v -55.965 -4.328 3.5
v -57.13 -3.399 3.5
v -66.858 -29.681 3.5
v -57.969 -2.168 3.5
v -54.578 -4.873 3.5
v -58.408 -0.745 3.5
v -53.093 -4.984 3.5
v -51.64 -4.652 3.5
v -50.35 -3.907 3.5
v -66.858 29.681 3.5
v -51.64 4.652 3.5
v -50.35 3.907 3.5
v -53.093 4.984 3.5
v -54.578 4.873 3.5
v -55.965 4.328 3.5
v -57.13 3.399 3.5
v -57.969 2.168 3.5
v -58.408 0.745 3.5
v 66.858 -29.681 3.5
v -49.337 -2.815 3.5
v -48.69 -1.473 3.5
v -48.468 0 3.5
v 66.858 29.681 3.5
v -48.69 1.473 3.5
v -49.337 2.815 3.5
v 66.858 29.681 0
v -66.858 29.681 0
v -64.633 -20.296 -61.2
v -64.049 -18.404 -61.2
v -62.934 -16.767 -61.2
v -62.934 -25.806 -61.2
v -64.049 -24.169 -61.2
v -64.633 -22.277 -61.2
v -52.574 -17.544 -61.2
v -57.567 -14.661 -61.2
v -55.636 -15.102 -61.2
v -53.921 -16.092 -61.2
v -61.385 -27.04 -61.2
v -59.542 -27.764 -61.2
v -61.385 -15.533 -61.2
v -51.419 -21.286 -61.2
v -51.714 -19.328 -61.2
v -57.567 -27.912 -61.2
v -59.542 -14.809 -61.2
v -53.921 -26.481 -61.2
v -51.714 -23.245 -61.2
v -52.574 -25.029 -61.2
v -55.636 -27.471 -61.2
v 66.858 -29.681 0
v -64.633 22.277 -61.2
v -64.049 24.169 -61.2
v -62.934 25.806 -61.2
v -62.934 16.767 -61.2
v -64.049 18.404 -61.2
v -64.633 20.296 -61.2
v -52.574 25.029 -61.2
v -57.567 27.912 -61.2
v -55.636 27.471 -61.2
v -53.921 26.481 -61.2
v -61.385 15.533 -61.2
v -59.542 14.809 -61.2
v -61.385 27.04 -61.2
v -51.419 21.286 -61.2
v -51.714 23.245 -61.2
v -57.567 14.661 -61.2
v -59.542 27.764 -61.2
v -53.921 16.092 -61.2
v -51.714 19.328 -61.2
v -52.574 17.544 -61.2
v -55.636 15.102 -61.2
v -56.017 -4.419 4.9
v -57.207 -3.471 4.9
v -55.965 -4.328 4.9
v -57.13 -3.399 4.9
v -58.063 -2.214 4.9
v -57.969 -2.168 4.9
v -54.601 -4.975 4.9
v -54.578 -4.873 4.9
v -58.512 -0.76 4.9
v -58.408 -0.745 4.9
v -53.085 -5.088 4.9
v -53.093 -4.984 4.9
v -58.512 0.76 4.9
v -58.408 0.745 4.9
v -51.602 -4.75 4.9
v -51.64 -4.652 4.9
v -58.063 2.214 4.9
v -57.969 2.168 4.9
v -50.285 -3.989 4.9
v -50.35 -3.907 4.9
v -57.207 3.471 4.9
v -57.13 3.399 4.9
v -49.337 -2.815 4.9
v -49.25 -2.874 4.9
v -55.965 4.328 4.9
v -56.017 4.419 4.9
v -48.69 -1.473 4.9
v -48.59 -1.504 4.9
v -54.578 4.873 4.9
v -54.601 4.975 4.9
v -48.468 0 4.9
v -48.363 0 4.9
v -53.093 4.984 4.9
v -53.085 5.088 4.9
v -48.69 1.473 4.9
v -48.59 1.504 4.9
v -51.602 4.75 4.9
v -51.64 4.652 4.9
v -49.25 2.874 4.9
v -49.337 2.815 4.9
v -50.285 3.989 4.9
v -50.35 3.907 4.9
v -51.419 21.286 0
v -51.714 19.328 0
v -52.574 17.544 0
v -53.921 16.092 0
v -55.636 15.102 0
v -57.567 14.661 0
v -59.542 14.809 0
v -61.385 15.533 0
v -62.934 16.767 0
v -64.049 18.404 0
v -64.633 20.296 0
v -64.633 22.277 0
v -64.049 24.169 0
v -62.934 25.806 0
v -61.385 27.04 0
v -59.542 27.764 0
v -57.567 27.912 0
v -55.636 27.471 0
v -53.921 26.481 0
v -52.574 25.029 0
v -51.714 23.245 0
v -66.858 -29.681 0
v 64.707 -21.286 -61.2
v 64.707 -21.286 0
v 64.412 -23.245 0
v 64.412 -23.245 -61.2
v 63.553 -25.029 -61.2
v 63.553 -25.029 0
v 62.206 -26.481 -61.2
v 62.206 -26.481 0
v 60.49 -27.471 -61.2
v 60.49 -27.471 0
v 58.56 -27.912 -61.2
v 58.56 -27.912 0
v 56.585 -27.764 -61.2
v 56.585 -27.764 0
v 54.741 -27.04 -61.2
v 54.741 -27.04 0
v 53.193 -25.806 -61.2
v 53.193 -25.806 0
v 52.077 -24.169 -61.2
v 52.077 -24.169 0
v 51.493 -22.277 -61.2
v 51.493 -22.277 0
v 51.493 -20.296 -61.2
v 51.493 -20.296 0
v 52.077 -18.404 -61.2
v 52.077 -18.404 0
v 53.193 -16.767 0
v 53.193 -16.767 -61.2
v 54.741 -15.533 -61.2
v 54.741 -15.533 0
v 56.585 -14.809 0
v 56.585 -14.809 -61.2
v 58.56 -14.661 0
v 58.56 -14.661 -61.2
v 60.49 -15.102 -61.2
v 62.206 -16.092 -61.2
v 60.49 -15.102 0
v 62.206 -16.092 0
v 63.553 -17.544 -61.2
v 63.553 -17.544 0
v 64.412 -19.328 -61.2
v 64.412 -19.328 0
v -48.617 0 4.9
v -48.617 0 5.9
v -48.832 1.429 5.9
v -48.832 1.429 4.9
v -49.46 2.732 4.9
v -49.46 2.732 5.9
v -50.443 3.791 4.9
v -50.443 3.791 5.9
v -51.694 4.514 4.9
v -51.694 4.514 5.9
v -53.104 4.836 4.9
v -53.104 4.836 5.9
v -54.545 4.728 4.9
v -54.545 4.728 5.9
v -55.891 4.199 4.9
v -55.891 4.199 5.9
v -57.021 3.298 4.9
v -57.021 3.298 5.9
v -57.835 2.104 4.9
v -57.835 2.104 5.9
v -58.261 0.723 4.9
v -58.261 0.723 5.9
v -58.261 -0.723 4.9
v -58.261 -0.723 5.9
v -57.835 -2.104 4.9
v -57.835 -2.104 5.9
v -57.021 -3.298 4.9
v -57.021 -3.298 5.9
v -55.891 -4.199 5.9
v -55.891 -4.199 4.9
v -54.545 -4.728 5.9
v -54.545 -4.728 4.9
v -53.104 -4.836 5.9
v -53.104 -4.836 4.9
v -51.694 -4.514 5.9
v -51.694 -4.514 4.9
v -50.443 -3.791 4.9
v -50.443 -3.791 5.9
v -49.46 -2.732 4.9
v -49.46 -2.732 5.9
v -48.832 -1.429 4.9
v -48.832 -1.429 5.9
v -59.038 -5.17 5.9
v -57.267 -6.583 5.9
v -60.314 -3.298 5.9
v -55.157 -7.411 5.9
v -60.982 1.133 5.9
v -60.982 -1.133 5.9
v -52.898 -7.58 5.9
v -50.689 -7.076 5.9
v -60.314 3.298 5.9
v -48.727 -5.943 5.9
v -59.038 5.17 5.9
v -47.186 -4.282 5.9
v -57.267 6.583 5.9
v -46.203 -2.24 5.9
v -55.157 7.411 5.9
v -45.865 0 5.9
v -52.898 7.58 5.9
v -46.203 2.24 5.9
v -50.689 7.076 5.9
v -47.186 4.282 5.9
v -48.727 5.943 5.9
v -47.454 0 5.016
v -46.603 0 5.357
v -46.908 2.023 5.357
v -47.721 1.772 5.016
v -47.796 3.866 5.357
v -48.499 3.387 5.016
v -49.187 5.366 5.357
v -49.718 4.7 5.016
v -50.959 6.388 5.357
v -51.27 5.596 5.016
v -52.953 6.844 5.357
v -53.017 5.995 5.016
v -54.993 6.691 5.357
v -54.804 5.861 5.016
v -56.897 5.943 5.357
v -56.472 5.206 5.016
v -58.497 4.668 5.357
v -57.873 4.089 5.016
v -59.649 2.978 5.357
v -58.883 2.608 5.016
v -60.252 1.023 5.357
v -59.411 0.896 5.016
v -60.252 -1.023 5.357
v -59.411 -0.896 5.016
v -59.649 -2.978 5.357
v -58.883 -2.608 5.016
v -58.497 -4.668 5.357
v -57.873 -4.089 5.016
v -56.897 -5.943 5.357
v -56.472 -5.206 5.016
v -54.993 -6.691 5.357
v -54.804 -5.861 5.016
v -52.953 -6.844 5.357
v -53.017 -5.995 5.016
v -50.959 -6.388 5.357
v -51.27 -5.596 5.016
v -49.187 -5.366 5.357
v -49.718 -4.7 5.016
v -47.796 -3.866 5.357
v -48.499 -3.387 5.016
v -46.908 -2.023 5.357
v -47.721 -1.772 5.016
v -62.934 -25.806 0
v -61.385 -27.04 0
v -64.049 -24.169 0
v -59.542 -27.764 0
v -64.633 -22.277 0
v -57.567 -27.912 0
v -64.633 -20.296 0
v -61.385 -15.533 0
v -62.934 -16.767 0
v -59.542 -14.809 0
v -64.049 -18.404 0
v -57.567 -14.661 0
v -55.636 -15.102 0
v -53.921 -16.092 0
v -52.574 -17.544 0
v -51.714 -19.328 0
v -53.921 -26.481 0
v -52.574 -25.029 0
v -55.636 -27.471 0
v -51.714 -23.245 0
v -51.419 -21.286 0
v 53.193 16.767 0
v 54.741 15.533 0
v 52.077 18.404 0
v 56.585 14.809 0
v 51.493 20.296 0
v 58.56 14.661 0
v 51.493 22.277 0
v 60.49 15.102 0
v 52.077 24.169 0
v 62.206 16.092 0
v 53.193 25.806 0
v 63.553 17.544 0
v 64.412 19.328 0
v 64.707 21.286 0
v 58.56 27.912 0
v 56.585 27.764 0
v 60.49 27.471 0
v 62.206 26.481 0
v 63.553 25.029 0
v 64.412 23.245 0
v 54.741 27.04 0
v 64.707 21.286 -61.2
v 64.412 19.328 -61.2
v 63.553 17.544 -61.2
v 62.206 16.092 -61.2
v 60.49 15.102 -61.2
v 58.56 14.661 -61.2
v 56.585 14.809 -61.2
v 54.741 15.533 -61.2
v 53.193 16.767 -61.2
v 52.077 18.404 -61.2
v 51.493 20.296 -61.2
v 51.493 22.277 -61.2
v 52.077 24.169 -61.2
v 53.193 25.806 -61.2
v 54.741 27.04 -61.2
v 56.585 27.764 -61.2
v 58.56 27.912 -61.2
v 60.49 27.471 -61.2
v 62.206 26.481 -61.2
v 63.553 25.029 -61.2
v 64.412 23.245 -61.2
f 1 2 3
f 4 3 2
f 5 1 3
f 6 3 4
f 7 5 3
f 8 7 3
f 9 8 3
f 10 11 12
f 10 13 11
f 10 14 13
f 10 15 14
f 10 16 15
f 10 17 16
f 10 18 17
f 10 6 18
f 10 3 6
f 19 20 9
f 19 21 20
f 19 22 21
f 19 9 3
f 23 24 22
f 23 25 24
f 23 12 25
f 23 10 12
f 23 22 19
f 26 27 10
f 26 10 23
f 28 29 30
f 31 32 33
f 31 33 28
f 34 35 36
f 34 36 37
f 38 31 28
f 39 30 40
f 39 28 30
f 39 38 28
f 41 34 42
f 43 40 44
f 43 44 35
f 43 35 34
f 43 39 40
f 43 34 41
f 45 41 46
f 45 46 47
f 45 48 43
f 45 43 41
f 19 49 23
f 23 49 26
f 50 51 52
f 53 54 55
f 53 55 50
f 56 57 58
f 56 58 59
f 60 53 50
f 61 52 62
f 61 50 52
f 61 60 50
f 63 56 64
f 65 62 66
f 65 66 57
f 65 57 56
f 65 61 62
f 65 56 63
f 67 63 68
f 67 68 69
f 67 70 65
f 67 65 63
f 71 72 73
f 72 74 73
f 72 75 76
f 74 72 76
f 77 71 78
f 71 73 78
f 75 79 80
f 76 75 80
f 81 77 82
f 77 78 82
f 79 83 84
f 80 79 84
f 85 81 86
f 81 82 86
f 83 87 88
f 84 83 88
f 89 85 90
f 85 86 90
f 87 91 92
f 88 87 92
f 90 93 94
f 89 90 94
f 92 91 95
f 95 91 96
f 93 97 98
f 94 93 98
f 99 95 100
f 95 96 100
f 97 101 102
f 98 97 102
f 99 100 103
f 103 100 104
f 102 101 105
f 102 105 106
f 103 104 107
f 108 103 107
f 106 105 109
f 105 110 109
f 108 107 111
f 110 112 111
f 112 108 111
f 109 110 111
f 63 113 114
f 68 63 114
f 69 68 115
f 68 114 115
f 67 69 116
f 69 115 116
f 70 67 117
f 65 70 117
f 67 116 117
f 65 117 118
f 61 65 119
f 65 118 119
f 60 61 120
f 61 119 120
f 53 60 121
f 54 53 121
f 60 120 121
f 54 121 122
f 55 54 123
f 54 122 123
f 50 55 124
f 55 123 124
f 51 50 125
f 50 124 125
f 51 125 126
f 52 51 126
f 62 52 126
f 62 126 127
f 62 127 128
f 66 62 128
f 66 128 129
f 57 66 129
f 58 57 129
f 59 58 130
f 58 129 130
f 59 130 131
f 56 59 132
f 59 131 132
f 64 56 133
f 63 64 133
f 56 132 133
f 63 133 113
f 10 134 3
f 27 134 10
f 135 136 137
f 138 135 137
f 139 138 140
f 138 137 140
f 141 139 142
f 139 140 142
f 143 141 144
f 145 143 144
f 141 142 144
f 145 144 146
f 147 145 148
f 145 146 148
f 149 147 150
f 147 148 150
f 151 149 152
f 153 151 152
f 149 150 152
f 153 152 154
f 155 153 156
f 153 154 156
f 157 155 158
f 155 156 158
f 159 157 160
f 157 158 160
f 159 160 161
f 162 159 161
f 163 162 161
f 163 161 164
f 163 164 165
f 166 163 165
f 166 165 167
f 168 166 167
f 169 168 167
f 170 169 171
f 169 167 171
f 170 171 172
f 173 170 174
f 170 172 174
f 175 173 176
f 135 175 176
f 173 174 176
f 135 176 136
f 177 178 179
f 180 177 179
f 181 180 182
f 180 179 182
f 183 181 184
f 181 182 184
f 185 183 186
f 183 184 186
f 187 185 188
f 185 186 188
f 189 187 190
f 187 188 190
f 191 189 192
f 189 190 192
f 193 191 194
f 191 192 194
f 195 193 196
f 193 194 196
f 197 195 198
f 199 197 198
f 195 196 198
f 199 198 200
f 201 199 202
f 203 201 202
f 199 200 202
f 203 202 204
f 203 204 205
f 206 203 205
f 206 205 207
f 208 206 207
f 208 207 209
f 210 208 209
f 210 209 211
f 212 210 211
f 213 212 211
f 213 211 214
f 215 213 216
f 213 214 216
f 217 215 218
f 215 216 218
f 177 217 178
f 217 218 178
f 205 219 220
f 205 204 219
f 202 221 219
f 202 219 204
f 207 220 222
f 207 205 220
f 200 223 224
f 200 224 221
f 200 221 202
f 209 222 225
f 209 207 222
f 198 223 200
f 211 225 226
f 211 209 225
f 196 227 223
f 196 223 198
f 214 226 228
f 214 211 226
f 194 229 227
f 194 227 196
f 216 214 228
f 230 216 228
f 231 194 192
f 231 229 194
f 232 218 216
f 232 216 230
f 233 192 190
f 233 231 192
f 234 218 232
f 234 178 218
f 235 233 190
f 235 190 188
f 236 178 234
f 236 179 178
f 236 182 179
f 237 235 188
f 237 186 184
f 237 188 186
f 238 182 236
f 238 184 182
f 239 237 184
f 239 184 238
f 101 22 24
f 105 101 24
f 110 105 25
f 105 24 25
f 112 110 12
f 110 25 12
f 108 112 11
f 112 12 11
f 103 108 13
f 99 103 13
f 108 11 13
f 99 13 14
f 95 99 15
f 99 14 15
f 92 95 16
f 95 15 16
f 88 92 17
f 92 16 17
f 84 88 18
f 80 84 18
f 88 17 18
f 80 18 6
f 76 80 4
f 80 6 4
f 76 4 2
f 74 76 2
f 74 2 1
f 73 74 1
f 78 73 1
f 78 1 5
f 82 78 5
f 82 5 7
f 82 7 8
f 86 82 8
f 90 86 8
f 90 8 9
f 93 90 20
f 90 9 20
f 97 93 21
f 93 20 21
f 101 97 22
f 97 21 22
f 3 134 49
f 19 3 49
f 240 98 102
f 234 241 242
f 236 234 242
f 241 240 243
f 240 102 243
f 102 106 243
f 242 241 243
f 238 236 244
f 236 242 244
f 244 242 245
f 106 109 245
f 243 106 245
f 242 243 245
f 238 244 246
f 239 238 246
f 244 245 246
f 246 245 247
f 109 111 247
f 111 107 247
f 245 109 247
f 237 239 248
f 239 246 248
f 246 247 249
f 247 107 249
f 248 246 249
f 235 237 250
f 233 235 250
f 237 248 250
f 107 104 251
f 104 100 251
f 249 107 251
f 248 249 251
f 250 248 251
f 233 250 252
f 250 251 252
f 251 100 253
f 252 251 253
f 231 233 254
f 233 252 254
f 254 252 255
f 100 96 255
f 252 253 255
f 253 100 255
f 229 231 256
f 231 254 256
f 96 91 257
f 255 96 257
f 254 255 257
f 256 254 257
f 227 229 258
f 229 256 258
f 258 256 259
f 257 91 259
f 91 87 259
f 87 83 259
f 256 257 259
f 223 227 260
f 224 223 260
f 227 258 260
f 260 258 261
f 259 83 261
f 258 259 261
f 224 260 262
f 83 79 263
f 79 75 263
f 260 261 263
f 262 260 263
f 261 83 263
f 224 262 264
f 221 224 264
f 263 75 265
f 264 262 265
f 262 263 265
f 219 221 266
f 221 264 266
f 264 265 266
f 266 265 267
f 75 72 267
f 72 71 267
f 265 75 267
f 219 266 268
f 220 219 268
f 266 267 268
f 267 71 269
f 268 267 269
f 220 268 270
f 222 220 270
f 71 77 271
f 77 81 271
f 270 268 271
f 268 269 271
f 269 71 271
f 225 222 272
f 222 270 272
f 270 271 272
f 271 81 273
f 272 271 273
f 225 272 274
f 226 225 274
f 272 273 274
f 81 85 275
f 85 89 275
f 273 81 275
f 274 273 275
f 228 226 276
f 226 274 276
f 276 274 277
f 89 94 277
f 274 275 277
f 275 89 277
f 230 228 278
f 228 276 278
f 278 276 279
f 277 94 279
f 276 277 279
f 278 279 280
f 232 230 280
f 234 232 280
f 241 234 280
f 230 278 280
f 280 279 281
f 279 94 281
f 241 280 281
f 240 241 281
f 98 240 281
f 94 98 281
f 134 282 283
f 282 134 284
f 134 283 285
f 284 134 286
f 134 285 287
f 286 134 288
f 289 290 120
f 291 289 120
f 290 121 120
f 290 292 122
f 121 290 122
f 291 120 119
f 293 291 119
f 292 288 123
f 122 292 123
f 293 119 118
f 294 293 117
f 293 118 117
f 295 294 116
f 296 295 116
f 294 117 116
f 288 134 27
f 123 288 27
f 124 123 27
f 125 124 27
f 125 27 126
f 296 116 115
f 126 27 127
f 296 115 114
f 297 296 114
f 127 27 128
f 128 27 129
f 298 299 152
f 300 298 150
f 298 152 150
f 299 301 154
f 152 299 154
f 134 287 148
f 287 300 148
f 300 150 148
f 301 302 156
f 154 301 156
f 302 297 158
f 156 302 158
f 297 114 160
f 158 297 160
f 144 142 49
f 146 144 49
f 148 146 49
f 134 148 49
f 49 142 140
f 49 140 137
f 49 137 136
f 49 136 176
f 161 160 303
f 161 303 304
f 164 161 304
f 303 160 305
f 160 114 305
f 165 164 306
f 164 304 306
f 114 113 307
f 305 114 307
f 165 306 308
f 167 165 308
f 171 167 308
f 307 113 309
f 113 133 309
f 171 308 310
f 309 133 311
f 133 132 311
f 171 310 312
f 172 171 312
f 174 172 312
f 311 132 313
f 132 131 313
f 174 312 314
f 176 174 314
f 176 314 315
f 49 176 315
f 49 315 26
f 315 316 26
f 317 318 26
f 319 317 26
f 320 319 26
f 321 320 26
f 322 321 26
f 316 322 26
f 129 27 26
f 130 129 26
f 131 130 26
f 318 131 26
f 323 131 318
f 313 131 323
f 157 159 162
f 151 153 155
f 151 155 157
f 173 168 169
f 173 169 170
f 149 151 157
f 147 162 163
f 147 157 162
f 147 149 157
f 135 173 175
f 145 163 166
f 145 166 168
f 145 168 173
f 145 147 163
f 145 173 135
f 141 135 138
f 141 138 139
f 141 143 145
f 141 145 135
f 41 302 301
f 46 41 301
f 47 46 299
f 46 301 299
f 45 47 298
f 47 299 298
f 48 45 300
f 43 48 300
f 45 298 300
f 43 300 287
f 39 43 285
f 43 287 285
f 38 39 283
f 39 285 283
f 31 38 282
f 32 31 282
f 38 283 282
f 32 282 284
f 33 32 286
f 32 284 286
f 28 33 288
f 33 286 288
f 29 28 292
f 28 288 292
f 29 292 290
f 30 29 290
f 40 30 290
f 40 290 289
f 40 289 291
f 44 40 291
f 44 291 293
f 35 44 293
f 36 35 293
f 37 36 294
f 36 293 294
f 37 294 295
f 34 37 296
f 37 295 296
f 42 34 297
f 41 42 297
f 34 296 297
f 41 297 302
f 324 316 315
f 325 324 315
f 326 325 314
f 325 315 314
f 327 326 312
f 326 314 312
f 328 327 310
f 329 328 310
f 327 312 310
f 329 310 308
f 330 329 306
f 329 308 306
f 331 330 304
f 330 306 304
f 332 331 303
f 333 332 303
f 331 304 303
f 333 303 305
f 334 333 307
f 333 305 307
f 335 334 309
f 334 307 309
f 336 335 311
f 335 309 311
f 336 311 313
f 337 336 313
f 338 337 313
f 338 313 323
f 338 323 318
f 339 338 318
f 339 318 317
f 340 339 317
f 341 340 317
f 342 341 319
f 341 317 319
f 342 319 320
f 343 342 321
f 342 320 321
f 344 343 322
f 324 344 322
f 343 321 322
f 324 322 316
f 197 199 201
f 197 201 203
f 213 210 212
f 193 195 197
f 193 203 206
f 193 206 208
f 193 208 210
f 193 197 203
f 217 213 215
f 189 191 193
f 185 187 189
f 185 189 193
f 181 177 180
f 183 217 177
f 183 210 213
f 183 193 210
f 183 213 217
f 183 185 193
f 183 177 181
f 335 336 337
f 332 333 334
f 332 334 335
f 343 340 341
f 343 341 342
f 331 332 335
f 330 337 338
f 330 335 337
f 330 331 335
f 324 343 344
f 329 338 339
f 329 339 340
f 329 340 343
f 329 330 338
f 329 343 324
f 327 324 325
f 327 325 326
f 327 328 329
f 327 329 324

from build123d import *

# Parameters (mm, degrees)
F0_W      = 133.715108037
F0_H      = 59.3623146415
F1_DEPTH  = 3.5
F2_R      = 6.6440898667
F3_DEPTH  = 61.2
F4_R      = 4.997826556
F5_DEPTH  = 1.4
F6_R      = 7.6010927322
F7_DEPTH  = 1
F9_R      = 4.8490813771
F10_DEPTH = 1


# Not quite as in the source:
# - a fillet or chamfer that OpenCascade refuses, or shapes differently, is made with other operations: its cross-section is extruded or revolved along the edge and cut away or added


with BuildPart() as f1:
    # F0 (on Top) → F1 (new body)
    with BuildSketch(Plane.XY):
        Rectangle(F0_W, F0_H)
    extrude(amount=F1_DEPTH)

    # F2 (on face) → F3 (join)
    with BuildSketch(Plane(origin=(0, 0, 0), x_dir=(1, 0, 0), z_dir=(0, 0, -1))):
        with Locations((-58.0631382763, 21.2864857167)):
            Circle(F2_R)
        with Locations((-58.0631382763, -21.2864857167)):
            Circle(F2_R)
        with Locations((58.0631382763, 21.2864857167)):
            Circle(F2_R)
        with Locations((58.0631382763, -21.2864857167)):
            Circle(F2_R)
    extrude(amount=F3_DEPTH)

    # F4 (on face) → F5 (join)
    with BuildSketch(Plane.XY.offset(3.5)):
        with Locations((-53.4660555422, 0)):
            Circle(F4_R)
    extrude(amount=F5_DEPTH)

    # F6 (on face) → F7 (join)
    with BuildSketch(Plane.XY.offset(4.9)):
        with Locations((-53.4660555422, 0)):
            Circle(F6_R)
    extrude(amount=F7_DEPTH)

    # F8: fillet of radius 3.6213203436 on 1 edges, made by hand

    # F8_s1 → F8_t2 (revolve, cut)
    with BuildSketch(Plane.XZ):
        with BuildLine():
            ThreePointArc((-45.86496281, 5.9), (-47.0178827806, 5.1592821435), (-48.3634905139, 4.9))
            Line((-48.3634905139, 4.9), (-45.86496281, 4.9))
            Line((-45.86496281, 4.9), (-45.86496281, 5.9))
        make_face()
    revolve(axis=Axis((-53.4660555422, 0, 4.9), (0, 0, 1)), mode=Mode.SUBTRACT)

    # F9 (on face) → F10 (cut)
    with BuildSketch(Plane.XY.offset(5.9)):
        with Locations((-53.4660555422, 0)):
            Circle(F9_R)
    extrude(amount=-F10_DEPTH, mode=Mode.SUBTRACT)


solid = f1.part
